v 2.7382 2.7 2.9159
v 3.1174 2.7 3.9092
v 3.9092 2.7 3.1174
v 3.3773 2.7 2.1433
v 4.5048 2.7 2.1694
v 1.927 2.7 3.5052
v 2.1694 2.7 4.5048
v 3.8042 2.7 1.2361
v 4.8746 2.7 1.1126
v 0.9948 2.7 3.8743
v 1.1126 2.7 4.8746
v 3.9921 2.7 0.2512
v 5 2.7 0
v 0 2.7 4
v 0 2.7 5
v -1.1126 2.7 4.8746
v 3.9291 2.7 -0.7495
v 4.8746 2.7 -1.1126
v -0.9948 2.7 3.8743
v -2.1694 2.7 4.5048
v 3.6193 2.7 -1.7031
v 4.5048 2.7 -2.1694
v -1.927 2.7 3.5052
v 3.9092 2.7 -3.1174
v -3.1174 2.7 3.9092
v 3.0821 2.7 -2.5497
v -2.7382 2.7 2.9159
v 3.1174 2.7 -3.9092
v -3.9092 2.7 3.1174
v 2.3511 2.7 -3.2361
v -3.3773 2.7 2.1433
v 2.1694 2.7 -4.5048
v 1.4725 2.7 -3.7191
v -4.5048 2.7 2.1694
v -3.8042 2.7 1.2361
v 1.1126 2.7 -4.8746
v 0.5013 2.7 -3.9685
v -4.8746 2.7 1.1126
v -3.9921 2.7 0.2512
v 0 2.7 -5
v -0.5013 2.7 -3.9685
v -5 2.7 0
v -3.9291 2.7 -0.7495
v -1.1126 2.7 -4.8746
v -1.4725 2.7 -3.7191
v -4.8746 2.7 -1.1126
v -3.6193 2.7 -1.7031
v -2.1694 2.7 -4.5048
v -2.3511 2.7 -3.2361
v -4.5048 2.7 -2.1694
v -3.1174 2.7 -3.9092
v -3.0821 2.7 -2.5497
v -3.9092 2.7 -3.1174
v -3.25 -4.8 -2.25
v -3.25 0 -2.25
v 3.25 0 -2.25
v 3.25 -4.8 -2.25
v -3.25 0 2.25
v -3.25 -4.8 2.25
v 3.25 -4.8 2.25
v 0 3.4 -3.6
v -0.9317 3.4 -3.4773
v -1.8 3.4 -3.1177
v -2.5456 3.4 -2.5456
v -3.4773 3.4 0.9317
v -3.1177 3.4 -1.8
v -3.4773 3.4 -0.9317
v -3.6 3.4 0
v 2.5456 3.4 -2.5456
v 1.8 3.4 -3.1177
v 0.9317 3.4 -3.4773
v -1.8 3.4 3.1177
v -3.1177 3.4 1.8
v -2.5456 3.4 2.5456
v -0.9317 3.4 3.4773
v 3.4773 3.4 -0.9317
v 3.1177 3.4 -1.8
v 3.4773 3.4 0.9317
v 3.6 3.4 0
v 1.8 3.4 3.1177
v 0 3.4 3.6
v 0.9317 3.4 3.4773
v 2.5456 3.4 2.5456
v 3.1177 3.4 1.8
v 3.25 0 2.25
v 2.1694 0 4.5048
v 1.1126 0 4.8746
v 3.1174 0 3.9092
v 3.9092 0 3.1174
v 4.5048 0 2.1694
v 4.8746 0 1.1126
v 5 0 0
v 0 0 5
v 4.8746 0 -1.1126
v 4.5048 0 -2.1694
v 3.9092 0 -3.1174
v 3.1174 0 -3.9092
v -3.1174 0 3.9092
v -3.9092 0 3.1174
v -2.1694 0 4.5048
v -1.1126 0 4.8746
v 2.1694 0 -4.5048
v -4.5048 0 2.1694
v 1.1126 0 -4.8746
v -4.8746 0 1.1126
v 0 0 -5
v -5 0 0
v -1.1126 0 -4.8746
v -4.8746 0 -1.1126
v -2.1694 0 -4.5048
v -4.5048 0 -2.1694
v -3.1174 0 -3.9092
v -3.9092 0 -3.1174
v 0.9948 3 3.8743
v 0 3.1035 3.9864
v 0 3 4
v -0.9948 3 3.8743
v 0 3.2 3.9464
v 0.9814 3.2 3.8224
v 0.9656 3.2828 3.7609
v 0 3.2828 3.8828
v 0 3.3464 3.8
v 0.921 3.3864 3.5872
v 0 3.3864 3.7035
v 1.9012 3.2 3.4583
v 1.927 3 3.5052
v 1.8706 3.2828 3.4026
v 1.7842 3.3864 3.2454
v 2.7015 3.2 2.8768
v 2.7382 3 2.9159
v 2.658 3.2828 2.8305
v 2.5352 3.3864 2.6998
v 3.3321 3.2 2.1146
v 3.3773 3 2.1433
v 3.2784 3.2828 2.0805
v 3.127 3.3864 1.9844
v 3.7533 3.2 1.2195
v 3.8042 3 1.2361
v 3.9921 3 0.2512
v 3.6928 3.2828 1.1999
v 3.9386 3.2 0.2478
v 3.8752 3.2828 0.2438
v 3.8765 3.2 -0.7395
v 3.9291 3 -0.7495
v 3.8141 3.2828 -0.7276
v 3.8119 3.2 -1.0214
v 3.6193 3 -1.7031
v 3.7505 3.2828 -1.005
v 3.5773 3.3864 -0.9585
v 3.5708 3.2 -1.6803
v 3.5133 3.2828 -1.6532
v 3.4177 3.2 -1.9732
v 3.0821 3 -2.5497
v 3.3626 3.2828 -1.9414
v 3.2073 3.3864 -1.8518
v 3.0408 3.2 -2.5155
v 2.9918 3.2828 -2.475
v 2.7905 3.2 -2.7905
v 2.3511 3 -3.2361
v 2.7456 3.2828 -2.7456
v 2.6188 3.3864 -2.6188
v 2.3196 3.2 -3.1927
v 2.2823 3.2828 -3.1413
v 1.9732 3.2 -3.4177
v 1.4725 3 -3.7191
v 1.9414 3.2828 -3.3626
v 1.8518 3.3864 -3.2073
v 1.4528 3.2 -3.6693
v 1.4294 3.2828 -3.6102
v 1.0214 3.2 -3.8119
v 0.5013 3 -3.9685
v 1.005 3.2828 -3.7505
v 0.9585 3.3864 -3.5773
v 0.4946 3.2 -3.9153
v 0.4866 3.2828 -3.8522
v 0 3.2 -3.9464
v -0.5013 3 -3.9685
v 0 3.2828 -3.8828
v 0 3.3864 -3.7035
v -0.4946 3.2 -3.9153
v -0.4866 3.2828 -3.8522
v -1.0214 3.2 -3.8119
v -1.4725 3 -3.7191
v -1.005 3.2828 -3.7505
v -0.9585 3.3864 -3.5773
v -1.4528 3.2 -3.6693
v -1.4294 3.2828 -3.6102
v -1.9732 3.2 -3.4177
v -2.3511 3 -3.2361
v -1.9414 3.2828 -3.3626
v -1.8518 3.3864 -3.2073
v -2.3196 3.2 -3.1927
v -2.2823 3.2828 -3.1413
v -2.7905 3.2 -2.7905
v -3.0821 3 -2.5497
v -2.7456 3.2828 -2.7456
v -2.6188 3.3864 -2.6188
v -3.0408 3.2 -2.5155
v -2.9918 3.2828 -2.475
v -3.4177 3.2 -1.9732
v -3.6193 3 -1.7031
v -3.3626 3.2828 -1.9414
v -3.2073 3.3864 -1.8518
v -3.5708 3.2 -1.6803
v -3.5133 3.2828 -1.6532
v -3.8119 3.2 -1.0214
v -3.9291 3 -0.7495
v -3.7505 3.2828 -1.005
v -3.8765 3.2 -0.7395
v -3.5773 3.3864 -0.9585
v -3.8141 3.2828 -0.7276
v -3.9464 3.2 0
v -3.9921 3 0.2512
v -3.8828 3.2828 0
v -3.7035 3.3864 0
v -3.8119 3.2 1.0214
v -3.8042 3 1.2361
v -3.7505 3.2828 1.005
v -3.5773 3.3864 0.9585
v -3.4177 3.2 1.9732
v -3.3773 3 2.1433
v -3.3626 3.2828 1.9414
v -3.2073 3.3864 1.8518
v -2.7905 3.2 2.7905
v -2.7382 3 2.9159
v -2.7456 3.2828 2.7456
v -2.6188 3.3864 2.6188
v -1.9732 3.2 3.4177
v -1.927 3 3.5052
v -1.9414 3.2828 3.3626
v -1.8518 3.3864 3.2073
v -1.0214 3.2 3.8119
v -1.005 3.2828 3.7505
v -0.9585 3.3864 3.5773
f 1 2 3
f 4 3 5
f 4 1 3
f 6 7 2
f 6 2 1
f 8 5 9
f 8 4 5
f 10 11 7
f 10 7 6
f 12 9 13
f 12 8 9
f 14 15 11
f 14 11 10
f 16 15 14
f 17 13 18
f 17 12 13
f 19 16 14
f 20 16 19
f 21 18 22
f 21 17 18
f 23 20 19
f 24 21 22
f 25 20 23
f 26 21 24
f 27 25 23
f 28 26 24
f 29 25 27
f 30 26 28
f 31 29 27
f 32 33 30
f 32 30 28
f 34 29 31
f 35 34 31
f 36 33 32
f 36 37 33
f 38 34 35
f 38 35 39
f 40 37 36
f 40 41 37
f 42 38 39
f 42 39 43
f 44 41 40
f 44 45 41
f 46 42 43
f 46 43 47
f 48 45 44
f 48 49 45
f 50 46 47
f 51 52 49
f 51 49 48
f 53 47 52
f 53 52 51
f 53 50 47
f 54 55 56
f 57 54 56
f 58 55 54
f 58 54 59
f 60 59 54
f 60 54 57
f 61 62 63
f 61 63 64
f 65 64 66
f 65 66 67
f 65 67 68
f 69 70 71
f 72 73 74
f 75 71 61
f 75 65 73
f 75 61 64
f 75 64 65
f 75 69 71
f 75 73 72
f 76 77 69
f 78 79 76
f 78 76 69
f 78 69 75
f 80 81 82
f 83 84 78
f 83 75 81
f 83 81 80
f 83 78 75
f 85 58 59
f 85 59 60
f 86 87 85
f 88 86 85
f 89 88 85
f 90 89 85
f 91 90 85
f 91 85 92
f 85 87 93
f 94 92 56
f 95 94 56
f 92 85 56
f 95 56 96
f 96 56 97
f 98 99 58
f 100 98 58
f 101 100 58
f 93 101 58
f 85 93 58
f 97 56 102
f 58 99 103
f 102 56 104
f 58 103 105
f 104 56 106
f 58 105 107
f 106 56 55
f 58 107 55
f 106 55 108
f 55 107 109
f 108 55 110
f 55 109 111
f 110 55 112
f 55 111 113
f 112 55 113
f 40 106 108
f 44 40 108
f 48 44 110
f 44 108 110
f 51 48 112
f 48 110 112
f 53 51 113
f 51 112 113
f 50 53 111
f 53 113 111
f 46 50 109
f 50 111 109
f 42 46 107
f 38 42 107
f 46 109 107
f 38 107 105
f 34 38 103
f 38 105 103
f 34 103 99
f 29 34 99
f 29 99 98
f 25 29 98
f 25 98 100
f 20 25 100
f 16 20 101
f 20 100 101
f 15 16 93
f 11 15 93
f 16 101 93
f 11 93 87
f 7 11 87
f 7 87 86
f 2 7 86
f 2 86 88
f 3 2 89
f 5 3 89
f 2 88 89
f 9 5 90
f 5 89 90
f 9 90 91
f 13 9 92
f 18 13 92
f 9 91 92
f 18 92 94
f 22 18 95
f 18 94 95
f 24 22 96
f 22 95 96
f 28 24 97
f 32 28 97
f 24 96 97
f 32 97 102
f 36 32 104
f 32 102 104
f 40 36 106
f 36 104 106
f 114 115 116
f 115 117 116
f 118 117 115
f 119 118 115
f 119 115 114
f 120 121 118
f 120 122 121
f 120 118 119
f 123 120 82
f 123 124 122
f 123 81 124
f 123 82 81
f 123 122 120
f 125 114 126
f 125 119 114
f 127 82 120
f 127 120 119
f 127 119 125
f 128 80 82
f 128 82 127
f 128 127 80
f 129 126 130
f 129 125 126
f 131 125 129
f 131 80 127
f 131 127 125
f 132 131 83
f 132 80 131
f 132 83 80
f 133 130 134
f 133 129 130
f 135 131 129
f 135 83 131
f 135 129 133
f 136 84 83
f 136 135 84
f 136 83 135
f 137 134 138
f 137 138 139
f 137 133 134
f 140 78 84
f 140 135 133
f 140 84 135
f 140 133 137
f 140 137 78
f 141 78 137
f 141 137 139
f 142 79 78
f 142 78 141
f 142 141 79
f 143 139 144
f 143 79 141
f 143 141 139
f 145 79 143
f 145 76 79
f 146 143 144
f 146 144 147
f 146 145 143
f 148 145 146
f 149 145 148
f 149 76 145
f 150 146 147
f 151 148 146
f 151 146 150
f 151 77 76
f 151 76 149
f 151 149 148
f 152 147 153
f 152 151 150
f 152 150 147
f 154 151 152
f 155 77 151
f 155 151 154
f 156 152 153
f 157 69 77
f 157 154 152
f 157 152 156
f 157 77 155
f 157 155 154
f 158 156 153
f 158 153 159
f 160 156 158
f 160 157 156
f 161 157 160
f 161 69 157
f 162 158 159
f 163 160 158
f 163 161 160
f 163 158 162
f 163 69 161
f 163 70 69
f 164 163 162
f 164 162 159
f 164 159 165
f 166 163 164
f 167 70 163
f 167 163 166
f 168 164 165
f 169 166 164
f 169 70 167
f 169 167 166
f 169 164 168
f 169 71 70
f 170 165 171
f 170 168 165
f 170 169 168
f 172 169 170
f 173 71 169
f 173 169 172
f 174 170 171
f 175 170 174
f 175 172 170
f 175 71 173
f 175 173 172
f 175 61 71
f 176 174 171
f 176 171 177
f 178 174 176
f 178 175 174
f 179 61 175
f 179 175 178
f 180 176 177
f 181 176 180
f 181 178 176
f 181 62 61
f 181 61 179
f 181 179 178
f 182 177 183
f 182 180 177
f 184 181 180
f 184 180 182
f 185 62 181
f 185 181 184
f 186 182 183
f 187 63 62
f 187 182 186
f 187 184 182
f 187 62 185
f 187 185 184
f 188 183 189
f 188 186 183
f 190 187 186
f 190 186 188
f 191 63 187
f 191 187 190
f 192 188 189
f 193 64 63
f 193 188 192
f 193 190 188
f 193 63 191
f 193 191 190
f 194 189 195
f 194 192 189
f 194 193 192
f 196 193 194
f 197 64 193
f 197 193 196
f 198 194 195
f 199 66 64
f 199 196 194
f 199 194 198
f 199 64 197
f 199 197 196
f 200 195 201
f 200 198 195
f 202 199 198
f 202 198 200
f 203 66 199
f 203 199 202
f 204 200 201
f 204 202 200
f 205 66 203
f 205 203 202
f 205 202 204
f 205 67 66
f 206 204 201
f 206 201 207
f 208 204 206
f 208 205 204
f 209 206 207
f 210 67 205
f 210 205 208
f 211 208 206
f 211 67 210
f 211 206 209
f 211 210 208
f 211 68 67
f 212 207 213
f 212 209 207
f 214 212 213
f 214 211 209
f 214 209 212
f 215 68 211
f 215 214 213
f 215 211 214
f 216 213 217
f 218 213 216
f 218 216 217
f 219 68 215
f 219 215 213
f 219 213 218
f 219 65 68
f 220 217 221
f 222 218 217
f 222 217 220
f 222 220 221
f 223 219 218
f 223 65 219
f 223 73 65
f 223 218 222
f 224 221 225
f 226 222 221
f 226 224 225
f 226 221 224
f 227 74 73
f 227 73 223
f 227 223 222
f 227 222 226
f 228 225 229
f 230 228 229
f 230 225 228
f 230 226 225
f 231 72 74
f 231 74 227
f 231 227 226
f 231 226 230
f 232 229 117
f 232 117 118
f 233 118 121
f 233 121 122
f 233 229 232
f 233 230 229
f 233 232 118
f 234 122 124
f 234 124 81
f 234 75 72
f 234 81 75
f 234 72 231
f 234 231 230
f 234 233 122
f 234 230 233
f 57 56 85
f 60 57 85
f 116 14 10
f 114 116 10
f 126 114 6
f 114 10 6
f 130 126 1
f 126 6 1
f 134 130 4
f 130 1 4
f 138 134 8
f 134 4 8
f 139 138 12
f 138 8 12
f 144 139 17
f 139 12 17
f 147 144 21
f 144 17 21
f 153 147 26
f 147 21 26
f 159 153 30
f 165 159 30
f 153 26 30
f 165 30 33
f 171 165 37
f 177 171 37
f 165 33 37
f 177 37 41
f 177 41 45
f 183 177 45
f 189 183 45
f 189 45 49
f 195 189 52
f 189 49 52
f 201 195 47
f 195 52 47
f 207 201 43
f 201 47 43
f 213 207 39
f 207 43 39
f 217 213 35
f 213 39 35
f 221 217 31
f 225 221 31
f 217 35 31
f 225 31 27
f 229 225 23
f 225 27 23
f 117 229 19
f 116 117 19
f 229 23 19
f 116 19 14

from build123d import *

# Parameters (mm, degrees)
SKETCH1_R           = 5
BOSS_EXTRUDE1_DEPTH = 2.7
SKETCH2_R           = 4
BOSS_EXTRUDE2_DEPTH = 0.7
FILLET1_R           = 0.4
SKETCH3_W           = 6.5
SKETCH3_H           = 4.5
BOSS_EXTRUDE3_DEPTH = 4.8


with BuildPart() as part:
    # Sketch1 → Boss-Extrude1 (new body)
    with BuildSketch(Plane(origin=(0, 0, 0), x_dir=(1, 0, 0), z_dir=(0, 1, 0))):
        with Locations(Location((0, 0, 0), (0, 0, 90))):
            Circle(SKETCH1_R)
    extrude(amount=BOSS_EXTRUDE1_DEPTH)

    # Sketch2 → Boss-Extrude2 (add)
    with BuildSketch(Plane(origin=(0, 2.7, 0), x_dir=(1, 0, 0), z_dir=(0, 1, 0))):
        with Locations(Location((0, 0, 0), (0, 0, 270))):
            Circle(SKETCH2_R)
    extrude(amount=BOSS_EXTRUDE2_DEPTH)

    # Fillet1
    fillet1_edges = [part.edges().sort_by_distance(p)[0] for p in [
        (0, 3.4, -4),
    ]]
    fillet(fillet1_edges, radius=FILLET1_R)

    # Sketch3 → Boss-Extrude3 (add)
    with BuildSketch(Plane.XZ):
        Rectangle(SKETCH3_W, SKETCH3_H)
    extrude(amount=BOSS_EXTRUDE3_DEPTH)


solid = part.part
